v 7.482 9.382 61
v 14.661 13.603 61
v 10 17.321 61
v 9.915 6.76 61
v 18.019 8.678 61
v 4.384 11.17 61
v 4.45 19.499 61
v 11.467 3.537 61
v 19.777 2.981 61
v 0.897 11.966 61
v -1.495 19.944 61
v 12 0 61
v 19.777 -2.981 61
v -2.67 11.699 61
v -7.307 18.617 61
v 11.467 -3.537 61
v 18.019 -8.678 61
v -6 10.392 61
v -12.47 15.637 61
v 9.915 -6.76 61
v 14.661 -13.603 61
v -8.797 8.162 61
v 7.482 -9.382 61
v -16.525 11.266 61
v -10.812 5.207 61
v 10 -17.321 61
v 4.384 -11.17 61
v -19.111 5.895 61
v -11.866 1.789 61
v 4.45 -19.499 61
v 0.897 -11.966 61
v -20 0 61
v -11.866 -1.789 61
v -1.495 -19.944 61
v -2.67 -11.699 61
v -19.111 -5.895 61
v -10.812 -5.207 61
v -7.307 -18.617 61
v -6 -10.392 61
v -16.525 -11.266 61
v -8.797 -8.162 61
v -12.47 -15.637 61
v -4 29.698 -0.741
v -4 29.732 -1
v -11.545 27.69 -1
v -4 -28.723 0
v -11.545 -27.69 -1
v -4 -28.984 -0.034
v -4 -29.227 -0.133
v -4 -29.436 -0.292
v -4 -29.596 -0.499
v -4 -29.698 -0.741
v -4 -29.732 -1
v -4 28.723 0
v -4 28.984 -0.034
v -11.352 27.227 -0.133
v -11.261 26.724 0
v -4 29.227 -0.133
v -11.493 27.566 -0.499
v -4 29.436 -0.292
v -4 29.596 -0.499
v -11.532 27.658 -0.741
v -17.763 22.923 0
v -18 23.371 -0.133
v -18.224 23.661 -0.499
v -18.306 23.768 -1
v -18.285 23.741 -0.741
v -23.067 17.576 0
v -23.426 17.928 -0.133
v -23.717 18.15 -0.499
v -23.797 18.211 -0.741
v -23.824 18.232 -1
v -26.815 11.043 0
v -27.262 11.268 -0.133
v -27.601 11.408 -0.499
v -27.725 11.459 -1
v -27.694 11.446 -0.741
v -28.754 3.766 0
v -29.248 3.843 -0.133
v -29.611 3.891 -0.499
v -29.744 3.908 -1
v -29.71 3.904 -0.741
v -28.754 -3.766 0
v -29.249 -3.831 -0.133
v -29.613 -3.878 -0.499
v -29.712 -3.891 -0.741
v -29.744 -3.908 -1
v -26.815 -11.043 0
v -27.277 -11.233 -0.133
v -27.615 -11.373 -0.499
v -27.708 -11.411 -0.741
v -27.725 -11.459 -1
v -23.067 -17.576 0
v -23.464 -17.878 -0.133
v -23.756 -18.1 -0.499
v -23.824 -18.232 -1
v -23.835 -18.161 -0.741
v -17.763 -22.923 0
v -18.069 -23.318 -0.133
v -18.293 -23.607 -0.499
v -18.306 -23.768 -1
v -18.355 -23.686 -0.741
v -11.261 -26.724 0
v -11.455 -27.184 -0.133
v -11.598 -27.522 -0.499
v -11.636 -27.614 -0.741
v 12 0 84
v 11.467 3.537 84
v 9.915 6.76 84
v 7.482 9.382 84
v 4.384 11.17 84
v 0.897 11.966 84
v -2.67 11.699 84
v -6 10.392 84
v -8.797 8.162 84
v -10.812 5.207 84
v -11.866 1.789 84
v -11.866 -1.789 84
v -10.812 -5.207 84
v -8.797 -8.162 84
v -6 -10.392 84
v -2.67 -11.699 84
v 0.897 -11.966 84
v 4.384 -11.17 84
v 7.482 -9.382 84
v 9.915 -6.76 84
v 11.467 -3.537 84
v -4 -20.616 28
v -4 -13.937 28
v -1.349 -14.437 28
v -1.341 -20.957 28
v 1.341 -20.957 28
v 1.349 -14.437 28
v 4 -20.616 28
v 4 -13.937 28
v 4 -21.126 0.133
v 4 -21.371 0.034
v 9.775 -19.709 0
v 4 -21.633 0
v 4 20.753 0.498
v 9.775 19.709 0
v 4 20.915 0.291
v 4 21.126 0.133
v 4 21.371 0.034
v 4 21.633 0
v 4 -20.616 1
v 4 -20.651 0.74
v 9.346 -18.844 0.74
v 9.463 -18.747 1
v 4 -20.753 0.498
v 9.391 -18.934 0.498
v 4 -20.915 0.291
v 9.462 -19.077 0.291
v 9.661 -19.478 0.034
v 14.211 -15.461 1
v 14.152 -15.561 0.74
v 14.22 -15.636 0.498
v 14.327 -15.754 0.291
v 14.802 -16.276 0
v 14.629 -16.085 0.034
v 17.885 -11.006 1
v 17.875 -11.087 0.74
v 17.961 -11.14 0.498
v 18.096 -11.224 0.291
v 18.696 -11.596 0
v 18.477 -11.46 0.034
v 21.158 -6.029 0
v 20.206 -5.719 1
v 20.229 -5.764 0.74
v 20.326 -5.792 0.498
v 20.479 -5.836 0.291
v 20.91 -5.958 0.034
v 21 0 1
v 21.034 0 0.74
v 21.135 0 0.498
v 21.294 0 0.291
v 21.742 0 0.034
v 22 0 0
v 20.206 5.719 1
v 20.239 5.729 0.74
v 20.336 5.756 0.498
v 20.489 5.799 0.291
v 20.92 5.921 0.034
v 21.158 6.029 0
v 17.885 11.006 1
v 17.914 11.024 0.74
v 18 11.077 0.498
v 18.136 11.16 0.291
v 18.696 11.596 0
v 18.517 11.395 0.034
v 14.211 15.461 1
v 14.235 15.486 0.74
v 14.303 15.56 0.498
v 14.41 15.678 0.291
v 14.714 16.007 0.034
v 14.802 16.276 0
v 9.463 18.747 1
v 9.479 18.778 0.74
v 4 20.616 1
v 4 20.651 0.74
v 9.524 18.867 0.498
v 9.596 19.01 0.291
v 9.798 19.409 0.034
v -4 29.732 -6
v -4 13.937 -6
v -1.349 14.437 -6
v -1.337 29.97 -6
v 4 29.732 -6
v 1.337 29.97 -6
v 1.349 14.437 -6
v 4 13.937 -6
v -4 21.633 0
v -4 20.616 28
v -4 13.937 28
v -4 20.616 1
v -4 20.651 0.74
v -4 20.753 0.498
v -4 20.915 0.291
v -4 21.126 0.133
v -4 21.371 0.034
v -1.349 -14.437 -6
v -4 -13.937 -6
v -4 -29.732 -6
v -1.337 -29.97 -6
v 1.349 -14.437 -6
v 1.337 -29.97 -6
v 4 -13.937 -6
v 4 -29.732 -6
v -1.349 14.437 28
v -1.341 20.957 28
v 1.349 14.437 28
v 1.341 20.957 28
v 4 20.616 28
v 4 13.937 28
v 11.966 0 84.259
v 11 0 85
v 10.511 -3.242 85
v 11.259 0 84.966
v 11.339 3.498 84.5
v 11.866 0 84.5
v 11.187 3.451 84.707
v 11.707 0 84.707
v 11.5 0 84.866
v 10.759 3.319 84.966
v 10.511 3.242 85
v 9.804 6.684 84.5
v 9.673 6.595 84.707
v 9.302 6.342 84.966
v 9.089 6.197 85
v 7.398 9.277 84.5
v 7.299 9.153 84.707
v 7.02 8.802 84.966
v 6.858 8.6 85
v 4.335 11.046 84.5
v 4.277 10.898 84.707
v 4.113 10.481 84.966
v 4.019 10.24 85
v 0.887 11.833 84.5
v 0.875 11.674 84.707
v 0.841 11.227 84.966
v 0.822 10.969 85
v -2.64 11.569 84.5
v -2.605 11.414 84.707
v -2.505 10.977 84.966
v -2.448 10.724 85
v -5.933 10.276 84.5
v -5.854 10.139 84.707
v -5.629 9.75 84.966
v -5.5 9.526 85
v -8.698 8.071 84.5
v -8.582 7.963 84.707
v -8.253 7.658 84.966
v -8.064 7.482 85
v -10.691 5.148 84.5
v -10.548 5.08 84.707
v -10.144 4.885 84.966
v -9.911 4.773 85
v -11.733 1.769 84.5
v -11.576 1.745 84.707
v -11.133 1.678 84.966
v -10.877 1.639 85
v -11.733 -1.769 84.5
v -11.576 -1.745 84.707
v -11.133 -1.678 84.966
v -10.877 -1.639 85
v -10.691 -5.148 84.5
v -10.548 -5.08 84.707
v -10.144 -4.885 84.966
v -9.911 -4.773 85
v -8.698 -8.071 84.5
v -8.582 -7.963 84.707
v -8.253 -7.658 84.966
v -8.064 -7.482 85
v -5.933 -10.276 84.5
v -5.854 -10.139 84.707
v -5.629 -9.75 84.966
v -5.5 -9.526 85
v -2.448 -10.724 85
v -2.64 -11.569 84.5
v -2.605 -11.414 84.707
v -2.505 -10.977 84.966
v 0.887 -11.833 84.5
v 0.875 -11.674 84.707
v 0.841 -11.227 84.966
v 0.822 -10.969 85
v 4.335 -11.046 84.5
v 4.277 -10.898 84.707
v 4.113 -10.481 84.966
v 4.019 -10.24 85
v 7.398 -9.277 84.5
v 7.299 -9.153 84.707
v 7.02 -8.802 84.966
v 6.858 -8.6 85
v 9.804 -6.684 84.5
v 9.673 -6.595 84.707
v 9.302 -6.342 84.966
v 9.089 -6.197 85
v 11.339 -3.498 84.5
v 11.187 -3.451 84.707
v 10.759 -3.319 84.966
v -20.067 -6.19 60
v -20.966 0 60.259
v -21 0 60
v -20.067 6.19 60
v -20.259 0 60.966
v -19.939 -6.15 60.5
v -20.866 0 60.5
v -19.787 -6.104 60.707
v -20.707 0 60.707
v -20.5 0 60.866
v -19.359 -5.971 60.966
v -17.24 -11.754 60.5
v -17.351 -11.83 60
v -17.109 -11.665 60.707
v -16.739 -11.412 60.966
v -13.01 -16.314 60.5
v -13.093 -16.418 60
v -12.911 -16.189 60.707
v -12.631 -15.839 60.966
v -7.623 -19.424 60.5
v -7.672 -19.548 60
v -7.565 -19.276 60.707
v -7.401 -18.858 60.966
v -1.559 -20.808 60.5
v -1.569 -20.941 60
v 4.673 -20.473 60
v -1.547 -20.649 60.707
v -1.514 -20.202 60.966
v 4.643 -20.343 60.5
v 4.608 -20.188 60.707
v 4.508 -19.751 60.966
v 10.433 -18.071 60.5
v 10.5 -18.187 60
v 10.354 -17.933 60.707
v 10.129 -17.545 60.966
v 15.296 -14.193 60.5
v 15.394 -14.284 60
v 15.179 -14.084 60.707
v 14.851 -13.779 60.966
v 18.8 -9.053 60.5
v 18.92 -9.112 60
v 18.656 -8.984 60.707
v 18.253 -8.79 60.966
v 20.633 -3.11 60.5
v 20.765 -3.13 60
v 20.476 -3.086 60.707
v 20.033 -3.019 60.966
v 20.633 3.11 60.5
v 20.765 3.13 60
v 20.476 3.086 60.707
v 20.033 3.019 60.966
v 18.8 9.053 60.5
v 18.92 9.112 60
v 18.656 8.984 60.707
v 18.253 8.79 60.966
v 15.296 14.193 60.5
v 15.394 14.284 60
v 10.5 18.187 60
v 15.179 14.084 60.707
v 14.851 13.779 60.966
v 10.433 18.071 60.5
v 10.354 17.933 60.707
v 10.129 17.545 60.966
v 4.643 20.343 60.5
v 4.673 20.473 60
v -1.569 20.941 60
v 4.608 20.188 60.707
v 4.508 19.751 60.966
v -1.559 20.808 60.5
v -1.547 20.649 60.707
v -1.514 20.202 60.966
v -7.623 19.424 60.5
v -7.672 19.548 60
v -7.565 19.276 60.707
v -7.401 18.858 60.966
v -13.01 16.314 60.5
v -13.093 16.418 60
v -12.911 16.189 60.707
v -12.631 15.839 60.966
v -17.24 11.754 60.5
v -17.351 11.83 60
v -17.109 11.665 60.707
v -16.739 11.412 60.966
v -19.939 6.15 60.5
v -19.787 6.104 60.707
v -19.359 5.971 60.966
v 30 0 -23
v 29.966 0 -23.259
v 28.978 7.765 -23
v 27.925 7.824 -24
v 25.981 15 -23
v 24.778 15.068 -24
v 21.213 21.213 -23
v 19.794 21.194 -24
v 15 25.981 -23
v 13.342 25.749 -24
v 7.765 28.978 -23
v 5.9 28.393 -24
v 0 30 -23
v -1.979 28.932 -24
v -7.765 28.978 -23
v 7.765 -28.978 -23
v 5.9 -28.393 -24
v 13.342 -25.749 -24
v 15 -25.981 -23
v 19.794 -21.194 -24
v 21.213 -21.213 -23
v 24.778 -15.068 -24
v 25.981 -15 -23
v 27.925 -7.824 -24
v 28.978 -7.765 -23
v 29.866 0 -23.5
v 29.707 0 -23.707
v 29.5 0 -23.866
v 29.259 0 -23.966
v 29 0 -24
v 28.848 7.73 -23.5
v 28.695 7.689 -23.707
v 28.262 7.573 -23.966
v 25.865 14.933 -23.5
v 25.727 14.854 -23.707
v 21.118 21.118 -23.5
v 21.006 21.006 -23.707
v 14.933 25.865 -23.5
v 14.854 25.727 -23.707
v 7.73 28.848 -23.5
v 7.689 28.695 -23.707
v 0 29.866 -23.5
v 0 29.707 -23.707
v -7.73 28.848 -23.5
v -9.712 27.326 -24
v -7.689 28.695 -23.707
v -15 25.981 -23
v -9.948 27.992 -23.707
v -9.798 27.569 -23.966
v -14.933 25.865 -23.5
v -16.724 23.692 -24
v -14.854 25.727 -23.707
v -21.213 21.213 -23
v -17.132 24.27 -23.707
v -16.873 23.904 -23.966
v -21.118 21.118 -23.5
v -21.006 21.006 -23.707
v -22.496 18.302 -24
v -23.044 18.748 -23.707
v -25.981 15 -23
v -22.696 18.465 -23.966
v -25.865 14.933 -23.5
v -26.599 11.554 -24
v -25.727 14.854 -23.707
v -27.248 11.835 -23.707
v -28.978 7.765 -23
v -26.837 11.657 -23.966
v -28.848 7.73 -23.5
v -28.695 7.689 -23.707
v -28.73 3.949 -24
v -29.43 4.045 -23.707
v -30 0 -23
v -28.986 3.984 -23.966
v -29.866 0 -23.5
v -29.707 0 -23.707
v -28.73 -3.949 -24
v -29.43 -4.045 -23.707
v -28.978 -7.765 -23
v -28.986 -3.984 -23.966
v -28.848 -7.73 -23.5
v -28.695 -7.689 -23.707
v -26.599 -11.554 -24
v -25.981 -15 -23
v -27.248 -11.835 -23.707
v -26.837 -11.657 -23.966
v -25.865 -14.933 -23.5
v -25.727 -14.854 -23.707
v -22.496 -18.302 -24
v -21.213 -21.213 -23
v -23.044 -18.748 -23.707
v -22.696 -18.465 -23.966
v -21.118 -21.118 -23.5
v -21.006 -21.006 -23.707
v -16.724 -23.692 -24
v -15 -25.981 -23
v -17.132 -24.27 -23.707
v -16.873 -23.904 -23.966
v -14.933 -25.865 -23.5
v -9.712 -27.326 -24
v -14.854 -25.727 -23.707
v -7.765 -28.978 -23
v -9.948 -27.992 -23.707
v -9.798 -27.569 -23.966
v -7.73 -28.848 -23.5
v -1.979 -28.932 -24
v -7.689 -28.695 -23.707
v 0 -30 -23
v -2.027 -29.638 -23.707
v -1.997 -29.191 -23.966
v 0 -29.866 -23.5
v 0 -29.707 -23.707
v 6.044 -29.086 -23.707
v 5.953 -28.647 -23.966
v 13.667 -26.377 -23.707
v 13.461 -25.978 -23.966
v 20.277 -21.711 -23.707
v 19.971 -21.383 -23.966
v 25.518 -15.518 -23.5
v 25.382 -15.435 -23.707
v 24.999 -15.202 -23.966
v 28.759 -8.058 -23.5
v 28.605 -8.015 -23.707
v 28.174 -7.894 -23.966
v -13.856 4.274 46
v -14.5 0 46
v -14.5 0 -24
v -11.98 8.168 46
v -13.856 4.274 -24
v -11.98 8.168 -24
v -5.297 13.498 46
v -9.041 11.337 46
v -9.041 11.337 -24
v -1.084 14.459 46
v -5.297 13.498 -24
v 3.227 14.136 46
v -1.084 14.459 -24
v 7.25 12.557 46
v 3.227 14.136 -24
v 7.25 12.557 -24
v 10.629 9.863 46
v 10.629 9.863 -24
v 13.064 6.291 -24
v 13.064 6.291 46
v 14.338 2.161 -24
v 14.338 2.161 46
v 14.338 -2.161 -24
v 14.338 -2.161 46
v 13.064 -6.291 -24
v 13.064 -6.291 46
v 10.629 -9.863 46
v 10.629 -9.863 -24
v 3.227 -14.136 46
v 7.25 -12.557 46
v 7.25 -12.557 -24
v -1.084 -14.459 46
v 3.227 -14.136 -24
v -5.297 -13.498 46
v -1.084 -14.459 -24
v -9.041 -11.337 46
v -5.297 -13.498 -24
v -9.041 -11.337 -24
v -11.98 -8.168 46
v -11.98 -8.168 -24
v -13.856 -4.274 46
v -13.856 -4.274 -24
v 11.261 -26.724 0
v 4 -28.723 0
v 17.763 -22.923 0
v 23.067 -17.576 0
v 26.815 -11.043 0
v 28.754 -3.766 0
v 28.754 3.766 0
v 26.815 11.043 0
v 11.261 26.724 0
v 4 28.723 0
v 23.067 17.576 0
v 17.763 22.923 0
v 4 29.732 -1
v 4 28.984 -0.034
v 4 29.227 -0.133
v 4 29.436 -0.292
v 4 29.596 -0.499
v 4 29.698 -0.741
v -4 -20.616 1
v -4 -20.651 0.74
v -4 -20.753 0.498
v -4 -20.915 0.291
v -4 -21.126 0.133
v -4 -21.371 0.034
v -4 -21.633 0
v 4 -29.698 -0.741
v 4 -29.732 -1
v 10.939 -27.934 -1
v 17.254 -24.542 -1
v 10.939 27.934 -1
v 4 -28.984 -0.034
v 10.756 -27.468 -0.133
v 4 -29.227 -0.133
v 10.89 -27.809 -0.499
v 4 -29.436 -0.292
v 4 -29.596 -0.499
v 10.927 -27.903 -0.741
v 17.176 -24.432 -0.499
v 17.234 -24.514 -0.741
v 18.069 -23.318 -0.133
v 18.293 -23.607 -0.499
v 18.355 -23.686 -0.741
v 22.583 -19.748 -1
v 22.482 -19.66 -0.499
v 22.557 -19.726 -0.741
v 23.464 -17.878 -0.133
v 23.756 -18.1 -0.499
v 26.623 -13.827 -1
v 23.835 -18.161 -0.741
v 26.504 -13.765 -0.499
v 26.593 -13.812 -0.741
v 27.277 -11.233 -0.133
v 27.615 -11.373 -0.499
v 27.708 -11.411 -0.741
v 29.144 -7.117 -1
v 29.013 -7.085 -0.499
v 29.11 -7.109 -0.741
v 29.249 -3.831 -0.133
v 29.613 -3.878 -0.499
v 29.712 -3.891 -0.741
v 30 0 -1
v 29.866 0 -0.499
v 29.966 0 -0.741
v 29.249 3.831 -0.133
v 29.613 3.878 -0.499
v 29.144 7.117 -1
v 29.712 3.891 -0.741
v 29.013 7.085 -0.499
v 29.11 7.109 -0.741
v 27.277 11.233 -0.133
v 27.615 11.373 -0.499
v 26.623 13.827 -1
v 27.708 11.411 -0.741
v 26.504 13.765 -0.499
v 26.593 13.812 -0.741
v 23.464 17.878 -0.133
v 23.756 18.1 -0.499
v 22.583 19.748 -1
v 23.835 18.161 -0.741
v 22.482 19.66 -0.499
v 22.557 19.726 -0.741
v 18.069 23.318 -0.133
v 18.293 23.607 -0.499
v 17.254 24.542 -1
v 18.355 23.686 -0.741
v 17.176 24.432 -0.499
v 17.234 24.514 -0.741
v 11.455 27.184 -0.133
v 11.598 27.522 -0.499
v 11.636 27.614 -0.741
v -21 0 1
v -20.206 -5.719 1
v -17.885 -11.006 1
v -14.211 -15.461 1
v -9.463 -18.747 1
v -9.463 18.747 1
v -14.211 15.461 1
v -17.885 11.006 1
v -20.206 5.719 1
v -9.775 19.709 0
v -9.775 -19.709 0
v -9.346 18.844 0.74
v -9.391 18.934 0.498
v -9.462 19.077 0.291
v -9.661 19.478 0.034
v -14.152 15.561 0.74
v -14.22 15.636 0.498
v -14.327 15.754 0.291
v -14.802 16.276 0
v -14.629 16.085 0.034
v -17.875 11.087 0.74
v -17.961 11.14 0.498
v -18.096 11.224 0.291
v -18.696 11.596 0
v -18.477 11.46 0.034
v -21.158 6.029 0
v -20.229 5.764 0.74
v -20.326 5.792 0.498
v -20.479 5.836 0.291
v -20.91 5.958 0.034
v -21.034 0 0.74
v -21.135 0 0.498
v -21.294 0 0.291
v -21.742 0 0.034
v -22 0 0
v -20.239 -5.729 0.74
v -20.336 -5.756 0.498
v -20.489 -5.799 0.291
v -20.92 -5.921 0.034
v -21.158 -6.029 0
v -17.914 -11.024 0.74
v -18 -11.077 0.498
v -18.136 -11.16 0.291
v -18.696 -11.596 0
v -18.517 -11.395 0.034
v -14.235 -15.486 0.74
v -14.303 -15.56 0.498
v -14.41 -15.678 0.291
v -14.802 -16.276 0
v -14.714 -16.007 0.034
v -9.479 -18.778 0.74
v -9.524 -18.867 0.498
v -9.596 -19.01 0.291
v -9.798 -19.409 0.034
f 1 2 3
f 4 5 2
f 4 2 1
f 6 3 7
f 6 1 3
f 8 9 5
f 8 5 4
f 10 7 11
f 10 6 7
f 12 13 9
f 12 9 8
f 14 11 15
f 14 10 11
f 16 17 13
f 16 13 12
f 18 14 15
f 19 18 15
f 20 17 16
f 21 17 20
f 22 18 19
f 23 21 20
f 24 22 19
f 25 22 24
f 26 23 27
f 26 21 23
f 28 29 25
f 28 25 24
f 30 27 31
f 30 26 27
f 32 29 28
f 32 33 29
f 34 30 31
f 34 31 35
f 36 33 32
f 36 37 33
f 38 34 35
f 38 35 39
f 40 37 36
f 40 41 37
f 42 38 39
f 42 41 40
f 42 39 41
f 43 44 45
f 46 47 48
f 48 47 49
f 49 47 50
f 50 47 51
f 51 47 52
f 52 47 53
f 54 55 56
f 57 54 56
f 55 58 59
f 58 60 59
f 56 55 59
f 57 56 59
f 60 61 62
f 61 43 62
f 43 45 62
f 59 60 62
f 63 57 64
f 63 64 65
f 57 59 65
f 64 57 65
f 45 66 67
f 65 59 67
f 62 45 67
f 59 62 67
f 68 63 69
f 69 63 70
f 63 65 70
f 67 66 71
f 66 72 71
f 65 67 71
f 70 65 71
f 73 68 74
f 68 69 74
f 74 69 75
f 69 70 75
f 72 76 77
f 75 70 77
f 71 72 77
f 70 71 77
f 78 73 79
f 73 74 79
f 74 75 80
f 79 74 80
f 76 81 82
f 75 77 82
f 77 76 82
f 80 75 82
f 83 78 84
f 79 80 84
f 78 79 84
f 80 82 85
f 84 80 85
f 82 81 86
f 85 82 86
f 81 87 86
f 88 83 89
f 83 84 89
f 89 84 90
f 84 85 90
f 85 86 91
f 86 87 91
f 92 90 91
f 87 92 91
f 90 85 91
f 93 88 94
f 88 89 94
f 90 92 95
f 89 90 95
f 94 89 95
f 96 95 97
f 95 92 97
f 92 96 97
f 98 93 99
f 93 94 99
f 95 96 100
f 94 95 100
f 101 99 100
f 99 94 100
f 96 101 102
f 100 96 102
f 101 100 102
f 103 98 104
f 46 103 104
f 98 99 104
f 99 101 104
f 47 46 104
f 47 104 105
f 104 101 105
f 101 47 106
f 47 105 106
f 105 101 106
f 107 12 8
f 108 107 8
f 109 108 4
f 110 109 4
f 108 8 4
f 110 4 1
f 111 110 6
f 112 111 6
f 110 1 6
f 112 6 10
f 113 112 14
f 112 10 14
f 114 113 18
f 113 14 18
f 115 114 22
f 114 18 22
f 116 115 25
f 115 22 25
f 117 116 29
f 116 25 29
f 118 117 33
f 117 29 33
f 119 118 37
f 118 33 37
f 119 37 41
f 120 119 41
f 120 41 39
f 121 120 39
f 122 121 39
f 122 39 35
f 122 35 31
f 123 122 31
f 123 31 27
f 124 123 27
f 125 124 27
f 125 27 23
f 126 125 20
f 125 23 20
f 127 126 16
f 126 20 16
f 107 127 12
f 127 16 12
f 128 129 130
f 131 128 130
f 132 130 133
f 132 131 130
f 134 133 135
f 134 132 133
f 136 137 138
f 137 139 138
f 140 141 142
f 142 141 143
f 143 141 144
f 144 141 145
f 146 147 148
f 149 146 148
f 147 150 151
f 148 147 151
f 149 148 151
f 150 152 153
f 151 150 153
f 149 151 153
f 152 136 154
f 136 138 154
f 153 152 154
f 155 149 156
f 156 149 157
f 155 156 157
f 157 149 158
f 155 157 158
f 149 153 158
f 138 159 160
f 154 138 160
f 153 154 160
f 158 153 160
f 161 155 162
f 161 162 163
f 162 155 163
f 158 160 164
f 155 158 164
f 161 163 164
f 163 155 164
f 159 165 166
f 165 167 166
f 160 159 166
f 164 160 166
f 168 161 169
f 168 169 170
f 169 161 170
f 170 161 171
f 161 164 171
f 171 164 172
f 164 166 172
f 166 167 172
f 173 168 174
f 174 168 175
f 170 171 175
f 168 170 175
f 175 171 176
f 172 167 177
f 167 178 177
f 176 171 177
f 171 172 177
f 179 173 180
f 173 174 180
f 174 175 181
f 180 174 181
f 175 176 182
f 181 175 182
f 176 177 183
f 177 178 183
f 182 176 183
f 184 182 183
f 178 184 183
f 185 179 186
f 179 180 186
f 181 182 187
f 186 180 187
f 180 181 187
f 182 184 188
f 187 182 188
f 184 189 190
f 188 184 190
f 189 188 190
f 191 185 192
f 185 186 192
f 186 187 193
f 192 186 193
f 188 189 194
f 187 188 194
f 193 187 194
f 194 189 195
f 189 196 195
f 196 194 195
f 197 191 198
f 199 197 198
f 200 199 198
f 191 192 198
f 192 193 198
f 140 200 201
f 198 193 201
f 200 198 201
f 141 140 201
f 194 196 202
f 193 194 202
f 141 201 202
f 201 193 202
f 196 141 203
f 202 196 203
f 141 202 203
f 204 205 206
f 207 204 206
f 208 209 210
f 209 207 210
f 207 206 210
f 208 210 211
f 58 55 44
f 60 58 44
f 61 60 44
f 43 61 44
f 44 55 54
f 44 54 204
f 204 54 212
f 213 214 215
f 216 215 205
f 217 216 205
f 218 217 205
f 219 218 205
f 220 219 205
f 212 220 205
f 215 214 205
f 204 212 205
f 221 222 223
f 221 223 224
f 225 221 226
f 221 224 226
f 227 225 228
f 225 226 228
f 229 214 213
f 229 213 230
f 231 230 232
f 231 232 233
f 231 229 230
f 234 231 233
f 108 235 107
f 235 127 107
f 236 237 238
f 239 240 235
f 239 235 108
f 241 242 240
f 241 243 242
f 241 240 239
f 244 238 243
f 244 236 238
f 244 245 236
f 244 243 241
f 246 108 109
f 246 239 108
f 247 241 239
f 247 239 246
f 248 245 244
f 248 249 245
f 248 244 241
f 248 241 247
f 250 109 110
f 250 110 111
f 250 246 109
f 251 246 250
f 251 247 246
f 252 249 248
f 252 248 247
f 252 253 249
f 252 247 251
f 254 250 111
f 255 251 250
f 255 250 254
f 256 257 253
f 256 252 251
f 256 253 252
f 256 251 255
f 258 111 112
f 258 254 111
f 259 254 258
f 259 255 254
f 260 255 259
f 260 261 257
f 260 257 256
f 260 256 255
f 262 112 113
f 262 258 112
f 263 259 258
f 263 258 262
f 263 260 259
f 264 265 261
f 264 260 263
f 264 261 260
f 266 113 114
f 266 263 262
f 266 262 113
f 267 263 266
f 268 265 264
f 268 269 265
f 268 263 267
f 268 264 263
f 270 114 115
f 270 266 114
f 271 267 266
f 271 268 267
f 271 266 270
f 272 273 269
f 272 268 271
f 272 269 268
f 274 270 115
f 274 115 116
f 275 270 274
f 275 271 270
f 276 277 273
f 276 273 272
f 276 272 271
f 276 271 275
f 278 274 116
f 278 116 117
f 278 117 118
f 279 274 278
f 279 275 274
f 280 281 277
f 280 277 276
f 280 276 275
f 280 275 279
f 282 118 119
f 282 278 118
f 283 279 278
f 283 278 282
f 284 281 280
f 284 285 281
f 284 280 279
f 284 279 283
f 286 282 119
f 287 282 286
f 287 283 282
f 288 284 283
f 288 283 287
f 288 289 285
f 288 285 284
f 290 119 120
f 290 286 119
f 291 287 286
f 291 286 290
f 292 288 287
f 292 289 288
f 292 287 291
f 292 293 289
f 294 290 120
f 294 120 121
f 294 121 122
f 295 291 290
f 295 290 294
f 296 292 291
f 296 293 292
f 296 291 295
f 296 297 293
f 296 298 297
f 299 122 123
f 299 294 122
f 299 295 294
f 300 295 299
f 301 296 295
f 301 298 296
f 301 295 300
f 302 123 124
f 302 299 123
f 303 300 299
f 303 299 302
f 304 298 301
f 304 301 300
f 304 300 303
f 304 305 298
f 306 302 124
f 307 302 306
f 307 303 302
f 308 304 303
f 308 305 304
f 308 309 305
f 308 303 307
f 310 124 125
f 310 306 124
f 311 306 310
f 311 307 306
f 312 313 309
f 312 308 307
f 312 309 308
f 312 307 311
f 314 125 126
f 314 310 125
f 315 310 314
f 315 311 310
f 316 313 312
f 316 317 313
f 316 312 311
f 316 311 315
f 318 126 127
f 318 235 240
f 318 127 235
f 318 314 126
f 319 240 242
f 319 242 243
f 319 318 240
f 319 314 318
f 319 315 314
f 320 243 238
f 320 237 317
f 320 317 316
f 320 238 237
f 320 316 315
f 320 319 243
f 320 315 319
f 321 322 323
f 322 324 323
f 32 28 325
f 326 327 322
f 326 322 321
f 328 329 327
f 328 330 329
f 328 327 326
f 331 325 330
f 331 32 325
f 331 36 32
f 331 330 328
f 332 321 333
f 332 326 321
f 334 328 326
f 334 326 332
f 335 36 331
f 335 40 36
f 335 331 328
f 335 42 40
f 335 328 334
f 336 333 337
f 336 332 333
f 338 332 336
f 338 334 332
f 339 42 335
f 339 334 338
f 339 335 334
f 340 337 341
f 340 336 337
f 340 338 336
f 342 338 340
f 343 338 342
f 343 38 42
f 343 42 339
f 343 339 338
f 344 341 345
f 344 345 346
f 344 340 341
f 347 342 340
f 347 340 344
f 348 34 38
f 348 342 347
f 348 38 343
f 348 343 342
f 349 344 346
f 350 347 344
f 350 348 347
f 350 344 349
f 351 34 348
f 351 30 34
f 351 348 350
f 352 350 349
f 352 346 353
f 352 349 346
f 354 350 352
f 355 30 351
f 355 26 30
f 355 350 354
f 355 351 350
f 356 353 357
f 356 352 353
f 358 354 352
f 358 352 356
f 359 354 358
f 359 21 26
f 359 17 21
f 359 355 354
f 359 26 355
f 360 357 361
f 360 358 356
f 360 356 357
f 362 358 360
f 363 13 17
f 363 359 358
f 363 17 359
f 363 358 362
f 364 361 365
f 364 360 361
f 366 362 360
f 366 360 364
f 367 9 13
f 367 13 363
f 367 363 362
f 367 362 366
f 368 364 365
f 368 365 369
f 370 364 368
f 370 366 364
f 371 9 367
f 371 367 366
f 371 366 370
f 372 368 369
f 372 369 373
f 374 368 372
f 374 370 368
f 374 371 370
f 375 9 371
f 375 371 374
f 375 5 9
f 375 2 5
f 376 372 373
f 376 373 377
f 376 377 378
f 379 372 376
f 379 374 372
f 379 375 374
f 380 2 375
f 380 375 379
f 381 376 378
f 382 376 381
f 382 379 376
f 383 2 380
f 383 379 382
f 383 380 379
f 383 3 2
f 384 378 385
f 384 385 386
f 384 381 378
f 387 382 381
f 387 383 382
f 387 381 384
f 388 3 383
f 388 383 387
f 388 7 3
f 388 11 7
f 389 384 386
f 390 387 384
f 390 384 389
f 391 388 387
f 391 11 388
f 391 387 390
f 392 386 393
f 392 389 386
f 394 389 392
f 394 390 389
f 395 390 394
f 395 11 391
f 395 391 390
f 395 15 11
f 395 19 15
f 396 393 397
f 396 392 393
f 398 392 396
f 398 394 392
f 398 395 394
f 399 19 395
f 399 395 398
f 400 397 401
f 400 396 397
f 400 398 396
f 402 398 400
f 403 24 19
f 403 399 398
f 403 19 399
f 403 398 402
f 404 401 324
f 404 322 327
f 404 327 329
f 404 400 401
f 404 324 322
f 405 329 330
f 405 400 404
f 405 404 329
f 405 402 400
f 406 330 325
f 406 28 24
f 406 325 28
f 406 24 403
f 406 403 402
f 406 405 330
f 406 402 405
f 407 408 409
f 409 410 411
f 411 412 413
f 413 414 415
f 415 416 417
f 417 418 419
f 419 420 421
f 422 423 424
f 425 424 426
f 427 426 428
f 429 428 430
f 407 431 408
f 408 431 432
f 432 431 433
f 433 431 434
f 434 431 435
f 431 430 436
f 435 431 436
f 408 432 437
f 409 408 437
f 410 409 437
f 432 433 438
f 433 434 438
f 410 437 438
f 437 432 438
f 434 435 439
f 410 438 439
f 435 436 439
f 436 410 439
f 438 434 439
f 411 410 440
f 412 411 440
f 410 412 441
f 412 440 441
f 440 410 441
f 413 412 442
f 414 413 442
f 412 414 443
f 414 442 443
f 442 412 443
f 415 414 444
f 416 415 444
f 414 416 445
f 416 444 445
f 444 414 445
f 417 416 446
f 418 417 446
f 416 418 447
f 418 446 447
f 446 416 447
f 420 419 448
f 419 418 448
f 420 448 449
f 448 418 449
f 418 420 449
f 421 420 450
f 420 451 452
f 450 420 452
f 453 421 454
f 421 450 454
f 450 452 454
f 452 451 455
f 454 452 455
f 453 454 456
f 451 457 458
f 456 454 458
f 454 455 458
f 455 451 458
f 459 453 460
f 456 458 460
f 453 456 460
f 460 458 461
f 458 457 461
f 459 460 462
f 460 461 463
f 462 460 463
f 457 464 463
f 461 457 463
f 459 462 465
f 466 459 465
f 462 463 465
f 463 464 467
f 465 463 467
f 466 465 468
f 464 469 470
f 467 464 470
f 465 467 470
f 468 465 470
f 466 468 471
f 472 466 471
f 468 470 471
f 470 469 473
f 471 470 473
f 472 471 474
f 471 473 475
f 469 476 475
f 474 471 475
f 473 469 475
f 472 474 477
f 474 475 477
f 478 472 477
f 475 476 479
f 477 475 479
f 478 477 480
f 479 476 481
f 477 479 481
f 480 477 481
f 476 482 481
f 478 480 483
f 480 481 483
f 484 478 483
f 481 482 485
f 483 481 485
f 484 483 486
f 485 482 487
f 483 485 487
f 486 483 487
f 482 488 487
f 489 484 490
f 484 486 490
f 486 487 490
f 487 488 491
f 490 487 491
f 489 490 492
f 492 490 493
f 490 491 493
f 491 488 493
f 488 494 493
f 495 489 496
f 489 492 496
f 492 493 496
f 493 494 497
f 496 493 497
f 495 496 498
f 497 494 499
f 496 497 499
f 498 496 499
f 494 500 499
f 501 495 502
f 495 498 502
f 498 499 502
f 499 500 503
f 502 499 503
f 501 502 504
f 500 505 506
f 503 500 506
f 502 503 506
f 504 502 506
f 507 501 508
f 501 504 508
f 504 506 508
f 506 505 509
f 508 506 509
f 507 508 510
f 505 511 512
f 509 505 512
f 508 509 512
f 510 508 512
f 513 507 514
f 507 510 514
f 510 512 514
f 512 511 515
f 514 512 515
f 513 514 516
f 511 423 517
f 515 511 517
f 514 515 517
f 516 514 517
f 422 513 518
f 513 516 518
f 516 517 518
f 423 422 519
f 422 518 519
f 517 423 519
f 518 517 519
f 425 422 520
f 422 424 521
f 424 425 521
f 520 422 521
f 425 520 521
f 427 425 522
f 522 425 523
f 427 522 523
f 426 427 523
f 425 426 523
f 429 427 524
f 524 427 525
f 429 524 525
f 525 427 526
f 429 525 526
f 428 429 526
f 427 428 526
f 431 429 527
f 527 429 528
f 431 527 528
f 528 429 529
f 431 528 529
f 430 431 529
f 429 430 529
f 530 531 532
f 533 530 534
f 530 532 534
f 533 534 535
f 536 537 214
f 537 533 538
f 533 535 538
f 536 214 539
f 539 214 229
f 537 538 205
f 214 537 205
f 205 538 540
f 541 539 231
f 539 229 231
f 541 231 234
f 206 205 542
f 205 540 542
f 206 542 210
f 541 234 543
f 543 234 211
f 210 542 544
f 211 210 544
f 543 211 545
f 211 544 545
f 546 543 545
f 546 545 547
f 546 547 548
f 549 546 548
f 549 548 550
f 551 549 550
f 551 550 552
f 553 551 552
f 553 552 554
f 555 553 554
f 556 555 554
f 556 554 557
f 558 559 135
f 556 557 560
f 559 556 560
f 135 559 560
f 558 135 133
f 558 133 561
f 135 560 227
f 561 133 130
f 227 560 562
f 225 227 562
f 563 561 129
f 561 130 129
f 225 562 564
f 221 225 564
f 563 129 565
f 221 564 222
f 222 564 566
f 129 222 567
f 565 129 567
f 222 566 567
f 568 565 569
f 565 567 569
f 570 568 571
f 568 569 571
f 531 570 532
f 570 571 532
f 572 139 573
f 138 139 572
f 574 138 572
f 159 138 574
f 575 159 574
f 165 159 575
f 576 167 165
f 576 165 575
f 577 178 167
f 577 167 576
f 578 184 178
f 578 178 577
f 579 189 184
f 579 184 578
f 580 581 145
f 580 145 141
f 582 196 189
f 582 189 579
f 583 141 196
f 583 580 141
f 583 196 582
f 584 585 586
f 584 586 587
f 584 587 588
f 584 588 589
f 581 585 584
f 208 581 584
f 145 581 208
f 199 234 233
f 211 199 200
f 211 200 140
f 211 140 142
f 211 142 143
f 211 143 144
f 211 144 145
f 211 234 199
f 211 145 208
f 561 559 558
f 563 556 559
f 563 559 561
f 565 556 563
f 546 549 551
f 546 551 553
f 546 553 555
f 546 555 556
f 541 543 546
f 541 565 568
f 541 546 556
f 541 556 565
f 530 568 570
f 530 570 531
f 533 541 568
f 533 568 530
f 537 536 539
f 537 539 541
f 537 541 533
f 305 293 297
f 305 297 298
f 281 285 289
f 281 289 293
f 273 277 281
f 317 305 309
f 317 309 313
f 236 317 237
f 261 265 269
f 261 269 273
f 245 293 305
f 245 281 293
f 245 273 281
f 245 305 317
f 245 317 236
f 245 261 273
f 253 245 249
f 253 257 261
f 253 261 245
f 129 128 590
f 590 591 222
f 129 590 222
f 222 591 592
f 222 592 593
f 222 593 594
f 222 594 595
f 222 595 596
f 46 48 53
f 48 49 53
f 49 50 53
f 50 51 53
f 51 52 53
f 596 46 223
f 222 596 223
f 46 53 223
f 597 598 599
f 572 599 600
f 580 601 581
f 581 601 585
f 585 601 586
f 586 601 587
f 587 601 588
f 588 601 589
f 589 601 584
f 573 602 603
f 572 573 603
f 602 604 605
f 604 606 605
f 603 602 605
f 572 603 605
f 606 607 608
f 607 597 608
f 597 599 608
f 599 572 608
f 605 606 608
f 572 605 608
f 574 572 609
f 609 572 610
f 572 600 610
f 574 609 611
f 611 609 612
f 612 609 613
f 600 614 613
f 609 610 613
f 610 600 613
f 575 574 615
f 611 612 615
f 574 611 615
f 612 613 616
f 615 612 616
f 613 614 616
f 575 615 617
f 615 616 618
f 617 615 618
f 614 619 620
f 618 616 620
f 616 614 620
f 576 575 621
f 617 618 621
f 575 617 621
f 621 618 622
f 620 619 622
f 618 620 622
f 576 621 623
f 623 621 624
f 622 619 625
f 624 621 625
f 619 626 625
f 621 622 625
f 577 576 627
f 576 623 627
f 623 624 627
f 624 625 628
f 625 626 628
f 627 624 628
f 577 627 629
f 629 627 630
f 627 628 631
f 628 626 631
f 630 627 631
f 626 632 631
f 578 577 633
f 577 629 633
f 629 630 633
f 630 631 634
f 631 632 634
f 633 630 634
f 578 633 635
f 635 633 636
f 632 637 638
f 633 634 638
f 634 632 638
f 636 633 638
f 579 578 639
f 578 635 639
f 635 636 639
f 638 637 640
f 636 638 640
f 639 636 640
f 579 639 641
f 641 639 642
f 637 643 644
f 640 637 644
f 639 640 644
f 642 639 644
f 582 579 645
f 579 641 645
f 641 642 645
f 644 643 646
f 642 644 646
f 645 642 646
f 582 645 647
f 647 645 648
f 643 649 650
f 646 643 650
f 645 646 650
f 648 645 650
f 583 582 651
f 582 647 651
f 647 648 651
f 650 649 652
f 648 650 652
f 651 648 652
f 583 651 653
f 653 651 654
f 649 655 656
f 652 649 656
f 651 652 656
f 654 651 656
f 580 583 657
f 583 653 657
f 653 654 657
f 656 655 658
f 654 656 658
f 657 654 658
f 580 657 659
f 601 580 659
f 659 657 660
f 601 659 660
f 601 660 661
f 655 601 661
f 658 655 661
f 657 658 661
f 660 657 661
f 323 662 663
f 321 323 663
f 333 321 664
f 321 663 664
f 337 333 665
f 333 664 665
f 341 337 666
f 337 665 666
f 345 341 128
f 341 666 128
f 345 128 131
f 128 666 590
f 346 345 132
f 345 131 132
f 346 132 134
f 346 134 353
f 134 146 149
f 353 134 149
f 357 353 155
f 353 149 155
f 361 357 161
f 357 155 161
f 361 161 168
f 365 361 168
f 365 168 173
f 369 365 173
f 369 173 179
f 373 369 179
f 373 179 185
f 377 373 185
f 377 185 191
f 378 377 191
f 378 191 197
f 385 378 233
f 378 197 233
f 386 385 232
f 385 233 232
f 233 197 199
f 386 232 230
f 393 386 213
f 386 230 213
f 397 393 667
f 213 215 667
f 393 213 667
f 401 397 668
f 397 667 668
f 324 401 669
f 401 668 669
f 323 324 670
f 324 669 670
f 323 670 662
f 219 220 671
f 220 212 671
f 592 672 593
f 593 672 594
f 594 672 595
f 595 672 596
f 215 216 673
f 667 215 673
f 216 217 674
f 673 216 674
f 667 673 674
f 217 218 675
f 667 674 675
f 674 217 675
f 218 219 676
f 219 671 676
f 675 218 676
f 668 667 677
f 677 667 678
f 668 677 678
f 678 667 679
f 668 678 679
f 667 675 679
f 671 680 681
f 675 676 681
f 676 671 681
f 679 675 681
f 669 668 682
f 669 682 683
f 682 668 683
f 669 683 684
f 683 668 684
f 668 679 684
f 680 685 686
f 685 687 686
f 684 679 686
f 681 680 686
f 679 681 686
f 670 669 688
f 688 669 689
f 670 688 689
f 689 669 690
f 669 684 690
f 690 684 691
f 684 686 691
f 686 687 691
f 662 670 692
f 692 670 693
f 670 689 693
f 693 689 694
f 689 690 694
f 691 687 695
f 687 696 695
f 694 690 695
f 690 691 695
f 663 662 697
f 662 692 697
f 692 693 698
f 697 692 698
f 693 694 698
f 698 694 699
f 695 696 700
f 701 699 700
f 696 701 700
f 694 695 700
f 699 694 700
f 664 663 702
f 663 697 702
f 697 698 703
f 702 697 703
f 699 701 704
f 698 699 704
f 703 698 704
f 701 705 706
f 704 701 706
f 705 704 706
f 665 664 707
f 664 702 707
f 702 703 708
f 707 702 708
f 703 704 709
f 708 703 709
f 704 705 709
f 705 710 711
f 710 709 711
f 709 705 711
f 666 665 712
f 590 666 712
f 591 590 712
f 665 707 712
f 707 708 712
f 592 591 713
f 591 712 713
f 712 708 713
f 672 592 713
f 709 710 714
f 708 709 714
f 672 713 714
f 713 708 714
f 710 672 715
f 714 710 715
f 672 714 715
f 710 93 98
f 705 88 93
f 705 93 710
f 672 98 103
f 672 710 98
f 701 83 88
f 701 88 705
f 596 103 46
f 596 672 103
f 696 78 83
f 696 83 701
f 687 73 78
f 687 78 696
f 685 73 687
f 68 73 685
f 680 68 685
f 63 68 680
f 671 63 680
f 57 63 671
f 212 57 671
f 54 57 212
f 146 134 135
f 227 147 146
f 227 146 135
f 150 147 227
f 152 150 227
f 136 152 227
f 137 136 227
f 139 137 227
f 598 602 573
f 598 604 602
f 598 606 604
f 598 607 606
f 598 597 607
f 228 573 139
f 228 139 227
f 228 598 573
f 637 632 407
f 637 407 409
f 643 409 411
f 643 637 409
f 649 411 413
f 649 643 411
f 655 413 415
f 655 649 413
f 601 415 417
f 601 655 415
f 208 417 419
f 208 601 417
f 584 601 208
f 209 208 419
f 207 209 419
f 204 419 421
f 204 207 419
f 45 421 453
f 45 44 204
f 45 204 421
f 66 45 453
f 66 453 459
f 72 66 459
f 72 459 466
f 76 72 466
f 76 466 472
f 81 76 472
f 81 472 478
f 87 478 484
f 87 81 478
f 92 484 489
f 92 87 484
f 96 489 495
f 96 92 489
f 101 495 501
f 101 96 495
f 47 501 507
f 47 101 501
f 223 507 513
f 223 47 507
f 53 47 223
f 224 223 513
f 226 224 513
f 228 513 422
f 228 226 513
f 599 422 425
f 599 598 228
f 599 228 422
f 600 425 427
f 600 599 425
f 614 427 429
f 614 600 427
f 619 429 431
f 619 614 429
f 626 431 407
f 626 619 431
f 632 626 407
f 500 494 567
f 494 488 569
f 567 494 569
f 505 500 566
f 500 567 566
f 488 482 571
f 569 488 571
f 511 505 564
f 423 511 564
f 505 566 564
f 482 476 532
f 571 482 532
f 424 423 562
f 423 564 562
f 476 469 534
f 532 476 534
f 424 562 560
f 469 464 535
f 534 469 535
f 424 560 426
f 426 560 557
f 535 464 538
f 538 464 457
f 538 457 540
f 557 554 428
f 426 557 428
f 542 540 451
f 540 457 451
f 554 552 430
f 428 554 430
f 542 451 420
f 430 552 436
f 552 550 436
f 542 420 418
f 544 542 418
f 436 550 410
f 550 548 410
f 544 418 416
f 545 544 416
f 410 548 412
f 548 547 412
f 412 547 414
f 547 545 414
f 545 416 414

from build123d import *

# Parameters (mm, degrees)
SKETCH1_R               = 30
SKETCH1_R_2             = 21
SKETCH1_R_3             = 12
BOSS_EXTRUDE1_DEPTH     = 24
SKETCH1_3_R             = 21
SKETCH1_3_R_2           = 12
BOSS_EXTRUDE2_DEPTH     = 61
BOSS_EXTRUDE3_START     = 61
SKETCH1_4_R             = 12
BOSS_EXTRUDE3_DEPTH     = 24
SKETCH2_R               = 14.5
CUT_EXTRUDE1_DEPTH      = 70
CUT_EXTRUDE2_DEPTH      = 96
CUT_EXTRUDE2_DEPTH_BACK = 96
SKETCH3_W               = 8
SKETCH3_H               = 34
FILLET1_R               = 1


with BuildPart() as part:
    # Sketch1 → Boss-Extrude1 (new body)
    # profile 1 of 3: a face of its own
    with BuildSketch(Plane.XY):
        Circle(SKETCH1_R)
        Circle(SKETCH1_R_2, mode=Mode.SUBTRACT)
    # profile 2 of 3: a face of its own
    with BuildSketch(Plane.XY):
        Circle(SKETCH1_R_2)
        Circle(SKETCH1_R_3, mode=Mode.SUBTRACT)
    # profile 3 of 3: a face of its own
    with BuildSketch(Plane.XY):
        Circle(SKETCH1_R_3)
    extrude(amount=-BOSS_EXTRUDE1_DEPTH)

    # Sketch1<3> → Boss-Extrude2 (add)
    # profile 1 of 2: a face of its own
    with BuildSketch(Plane.XY):
        with Locations(Location((0, 0, 0), (0, 0, 180))):
            Circle(SKETCH1_3_R)
        Circle(SKETCH1_3_R_2, mode=Mode.SUBTRACT)
    # profile 2 of 2: a face of its own
    with BuildSketch(Plane.XY):
        Circle(SKETCH1_3_R_2)
    extrude(amount=BOSS_EXTRUDE2_DEPTH)

    # Sketch1<4> → Boss-Extrude3 (add)
    with BuildSketch(Plane.XY.offset(BOSS_EXTRUDE3_START)):
        Circle(SKETCH1_4_R)
    extrude(amount=BOSS_EXTRUDE3_DEPTH)

    # Sketch2 → Cut-Extrude1 (cut)
    with BuildSketch(Plane(origin=(0, 0, -24), x_dir=(-1, 0, 0), z_dir=(0, 0, -1))):
        Circle(SKETCH2_R)
    extrude(amount=-CUT_EXTRUDE1_DEPTH, mode=Mode.SUBTRACT)

    # Sketch3 → Cut-Extrude2 (cut, two sides: drawn at the far end of the back side and taken through both)
    with BuildSketch(Plane(origin=(0, 0, 0), x_dir=(1, 0, 0), z_dir=(0, 1, 0)).offset(-CUT_EXTRUDE2_DEPTH_BACK)):
        with Locations((0, -11)):
            Rectangle(SKETCH3_W, SKETCH3_H)
    extrude(amount=CUT_EXTRUDE2_DEPTH + CUT_EXTRUDE2_DEPTH_BACK, mode=Mode.SUBTRACT)

    # Fillet1
    fillet1_edges = [part.edges().sort_by_distance(p)[0] for p in [
        (-12, 0, 85),
        (-16.201851746, -13.360389216, 0),
        (21, 0, 0),
        (-30, 0, 0),
        (22.583179581, 19.748417658, 0),
        (-30, 0, -24),
        (21, 0, 61),
    ]]
    fillet(fillet1_edges, radius=FILLET1_R)


solid = part.part
